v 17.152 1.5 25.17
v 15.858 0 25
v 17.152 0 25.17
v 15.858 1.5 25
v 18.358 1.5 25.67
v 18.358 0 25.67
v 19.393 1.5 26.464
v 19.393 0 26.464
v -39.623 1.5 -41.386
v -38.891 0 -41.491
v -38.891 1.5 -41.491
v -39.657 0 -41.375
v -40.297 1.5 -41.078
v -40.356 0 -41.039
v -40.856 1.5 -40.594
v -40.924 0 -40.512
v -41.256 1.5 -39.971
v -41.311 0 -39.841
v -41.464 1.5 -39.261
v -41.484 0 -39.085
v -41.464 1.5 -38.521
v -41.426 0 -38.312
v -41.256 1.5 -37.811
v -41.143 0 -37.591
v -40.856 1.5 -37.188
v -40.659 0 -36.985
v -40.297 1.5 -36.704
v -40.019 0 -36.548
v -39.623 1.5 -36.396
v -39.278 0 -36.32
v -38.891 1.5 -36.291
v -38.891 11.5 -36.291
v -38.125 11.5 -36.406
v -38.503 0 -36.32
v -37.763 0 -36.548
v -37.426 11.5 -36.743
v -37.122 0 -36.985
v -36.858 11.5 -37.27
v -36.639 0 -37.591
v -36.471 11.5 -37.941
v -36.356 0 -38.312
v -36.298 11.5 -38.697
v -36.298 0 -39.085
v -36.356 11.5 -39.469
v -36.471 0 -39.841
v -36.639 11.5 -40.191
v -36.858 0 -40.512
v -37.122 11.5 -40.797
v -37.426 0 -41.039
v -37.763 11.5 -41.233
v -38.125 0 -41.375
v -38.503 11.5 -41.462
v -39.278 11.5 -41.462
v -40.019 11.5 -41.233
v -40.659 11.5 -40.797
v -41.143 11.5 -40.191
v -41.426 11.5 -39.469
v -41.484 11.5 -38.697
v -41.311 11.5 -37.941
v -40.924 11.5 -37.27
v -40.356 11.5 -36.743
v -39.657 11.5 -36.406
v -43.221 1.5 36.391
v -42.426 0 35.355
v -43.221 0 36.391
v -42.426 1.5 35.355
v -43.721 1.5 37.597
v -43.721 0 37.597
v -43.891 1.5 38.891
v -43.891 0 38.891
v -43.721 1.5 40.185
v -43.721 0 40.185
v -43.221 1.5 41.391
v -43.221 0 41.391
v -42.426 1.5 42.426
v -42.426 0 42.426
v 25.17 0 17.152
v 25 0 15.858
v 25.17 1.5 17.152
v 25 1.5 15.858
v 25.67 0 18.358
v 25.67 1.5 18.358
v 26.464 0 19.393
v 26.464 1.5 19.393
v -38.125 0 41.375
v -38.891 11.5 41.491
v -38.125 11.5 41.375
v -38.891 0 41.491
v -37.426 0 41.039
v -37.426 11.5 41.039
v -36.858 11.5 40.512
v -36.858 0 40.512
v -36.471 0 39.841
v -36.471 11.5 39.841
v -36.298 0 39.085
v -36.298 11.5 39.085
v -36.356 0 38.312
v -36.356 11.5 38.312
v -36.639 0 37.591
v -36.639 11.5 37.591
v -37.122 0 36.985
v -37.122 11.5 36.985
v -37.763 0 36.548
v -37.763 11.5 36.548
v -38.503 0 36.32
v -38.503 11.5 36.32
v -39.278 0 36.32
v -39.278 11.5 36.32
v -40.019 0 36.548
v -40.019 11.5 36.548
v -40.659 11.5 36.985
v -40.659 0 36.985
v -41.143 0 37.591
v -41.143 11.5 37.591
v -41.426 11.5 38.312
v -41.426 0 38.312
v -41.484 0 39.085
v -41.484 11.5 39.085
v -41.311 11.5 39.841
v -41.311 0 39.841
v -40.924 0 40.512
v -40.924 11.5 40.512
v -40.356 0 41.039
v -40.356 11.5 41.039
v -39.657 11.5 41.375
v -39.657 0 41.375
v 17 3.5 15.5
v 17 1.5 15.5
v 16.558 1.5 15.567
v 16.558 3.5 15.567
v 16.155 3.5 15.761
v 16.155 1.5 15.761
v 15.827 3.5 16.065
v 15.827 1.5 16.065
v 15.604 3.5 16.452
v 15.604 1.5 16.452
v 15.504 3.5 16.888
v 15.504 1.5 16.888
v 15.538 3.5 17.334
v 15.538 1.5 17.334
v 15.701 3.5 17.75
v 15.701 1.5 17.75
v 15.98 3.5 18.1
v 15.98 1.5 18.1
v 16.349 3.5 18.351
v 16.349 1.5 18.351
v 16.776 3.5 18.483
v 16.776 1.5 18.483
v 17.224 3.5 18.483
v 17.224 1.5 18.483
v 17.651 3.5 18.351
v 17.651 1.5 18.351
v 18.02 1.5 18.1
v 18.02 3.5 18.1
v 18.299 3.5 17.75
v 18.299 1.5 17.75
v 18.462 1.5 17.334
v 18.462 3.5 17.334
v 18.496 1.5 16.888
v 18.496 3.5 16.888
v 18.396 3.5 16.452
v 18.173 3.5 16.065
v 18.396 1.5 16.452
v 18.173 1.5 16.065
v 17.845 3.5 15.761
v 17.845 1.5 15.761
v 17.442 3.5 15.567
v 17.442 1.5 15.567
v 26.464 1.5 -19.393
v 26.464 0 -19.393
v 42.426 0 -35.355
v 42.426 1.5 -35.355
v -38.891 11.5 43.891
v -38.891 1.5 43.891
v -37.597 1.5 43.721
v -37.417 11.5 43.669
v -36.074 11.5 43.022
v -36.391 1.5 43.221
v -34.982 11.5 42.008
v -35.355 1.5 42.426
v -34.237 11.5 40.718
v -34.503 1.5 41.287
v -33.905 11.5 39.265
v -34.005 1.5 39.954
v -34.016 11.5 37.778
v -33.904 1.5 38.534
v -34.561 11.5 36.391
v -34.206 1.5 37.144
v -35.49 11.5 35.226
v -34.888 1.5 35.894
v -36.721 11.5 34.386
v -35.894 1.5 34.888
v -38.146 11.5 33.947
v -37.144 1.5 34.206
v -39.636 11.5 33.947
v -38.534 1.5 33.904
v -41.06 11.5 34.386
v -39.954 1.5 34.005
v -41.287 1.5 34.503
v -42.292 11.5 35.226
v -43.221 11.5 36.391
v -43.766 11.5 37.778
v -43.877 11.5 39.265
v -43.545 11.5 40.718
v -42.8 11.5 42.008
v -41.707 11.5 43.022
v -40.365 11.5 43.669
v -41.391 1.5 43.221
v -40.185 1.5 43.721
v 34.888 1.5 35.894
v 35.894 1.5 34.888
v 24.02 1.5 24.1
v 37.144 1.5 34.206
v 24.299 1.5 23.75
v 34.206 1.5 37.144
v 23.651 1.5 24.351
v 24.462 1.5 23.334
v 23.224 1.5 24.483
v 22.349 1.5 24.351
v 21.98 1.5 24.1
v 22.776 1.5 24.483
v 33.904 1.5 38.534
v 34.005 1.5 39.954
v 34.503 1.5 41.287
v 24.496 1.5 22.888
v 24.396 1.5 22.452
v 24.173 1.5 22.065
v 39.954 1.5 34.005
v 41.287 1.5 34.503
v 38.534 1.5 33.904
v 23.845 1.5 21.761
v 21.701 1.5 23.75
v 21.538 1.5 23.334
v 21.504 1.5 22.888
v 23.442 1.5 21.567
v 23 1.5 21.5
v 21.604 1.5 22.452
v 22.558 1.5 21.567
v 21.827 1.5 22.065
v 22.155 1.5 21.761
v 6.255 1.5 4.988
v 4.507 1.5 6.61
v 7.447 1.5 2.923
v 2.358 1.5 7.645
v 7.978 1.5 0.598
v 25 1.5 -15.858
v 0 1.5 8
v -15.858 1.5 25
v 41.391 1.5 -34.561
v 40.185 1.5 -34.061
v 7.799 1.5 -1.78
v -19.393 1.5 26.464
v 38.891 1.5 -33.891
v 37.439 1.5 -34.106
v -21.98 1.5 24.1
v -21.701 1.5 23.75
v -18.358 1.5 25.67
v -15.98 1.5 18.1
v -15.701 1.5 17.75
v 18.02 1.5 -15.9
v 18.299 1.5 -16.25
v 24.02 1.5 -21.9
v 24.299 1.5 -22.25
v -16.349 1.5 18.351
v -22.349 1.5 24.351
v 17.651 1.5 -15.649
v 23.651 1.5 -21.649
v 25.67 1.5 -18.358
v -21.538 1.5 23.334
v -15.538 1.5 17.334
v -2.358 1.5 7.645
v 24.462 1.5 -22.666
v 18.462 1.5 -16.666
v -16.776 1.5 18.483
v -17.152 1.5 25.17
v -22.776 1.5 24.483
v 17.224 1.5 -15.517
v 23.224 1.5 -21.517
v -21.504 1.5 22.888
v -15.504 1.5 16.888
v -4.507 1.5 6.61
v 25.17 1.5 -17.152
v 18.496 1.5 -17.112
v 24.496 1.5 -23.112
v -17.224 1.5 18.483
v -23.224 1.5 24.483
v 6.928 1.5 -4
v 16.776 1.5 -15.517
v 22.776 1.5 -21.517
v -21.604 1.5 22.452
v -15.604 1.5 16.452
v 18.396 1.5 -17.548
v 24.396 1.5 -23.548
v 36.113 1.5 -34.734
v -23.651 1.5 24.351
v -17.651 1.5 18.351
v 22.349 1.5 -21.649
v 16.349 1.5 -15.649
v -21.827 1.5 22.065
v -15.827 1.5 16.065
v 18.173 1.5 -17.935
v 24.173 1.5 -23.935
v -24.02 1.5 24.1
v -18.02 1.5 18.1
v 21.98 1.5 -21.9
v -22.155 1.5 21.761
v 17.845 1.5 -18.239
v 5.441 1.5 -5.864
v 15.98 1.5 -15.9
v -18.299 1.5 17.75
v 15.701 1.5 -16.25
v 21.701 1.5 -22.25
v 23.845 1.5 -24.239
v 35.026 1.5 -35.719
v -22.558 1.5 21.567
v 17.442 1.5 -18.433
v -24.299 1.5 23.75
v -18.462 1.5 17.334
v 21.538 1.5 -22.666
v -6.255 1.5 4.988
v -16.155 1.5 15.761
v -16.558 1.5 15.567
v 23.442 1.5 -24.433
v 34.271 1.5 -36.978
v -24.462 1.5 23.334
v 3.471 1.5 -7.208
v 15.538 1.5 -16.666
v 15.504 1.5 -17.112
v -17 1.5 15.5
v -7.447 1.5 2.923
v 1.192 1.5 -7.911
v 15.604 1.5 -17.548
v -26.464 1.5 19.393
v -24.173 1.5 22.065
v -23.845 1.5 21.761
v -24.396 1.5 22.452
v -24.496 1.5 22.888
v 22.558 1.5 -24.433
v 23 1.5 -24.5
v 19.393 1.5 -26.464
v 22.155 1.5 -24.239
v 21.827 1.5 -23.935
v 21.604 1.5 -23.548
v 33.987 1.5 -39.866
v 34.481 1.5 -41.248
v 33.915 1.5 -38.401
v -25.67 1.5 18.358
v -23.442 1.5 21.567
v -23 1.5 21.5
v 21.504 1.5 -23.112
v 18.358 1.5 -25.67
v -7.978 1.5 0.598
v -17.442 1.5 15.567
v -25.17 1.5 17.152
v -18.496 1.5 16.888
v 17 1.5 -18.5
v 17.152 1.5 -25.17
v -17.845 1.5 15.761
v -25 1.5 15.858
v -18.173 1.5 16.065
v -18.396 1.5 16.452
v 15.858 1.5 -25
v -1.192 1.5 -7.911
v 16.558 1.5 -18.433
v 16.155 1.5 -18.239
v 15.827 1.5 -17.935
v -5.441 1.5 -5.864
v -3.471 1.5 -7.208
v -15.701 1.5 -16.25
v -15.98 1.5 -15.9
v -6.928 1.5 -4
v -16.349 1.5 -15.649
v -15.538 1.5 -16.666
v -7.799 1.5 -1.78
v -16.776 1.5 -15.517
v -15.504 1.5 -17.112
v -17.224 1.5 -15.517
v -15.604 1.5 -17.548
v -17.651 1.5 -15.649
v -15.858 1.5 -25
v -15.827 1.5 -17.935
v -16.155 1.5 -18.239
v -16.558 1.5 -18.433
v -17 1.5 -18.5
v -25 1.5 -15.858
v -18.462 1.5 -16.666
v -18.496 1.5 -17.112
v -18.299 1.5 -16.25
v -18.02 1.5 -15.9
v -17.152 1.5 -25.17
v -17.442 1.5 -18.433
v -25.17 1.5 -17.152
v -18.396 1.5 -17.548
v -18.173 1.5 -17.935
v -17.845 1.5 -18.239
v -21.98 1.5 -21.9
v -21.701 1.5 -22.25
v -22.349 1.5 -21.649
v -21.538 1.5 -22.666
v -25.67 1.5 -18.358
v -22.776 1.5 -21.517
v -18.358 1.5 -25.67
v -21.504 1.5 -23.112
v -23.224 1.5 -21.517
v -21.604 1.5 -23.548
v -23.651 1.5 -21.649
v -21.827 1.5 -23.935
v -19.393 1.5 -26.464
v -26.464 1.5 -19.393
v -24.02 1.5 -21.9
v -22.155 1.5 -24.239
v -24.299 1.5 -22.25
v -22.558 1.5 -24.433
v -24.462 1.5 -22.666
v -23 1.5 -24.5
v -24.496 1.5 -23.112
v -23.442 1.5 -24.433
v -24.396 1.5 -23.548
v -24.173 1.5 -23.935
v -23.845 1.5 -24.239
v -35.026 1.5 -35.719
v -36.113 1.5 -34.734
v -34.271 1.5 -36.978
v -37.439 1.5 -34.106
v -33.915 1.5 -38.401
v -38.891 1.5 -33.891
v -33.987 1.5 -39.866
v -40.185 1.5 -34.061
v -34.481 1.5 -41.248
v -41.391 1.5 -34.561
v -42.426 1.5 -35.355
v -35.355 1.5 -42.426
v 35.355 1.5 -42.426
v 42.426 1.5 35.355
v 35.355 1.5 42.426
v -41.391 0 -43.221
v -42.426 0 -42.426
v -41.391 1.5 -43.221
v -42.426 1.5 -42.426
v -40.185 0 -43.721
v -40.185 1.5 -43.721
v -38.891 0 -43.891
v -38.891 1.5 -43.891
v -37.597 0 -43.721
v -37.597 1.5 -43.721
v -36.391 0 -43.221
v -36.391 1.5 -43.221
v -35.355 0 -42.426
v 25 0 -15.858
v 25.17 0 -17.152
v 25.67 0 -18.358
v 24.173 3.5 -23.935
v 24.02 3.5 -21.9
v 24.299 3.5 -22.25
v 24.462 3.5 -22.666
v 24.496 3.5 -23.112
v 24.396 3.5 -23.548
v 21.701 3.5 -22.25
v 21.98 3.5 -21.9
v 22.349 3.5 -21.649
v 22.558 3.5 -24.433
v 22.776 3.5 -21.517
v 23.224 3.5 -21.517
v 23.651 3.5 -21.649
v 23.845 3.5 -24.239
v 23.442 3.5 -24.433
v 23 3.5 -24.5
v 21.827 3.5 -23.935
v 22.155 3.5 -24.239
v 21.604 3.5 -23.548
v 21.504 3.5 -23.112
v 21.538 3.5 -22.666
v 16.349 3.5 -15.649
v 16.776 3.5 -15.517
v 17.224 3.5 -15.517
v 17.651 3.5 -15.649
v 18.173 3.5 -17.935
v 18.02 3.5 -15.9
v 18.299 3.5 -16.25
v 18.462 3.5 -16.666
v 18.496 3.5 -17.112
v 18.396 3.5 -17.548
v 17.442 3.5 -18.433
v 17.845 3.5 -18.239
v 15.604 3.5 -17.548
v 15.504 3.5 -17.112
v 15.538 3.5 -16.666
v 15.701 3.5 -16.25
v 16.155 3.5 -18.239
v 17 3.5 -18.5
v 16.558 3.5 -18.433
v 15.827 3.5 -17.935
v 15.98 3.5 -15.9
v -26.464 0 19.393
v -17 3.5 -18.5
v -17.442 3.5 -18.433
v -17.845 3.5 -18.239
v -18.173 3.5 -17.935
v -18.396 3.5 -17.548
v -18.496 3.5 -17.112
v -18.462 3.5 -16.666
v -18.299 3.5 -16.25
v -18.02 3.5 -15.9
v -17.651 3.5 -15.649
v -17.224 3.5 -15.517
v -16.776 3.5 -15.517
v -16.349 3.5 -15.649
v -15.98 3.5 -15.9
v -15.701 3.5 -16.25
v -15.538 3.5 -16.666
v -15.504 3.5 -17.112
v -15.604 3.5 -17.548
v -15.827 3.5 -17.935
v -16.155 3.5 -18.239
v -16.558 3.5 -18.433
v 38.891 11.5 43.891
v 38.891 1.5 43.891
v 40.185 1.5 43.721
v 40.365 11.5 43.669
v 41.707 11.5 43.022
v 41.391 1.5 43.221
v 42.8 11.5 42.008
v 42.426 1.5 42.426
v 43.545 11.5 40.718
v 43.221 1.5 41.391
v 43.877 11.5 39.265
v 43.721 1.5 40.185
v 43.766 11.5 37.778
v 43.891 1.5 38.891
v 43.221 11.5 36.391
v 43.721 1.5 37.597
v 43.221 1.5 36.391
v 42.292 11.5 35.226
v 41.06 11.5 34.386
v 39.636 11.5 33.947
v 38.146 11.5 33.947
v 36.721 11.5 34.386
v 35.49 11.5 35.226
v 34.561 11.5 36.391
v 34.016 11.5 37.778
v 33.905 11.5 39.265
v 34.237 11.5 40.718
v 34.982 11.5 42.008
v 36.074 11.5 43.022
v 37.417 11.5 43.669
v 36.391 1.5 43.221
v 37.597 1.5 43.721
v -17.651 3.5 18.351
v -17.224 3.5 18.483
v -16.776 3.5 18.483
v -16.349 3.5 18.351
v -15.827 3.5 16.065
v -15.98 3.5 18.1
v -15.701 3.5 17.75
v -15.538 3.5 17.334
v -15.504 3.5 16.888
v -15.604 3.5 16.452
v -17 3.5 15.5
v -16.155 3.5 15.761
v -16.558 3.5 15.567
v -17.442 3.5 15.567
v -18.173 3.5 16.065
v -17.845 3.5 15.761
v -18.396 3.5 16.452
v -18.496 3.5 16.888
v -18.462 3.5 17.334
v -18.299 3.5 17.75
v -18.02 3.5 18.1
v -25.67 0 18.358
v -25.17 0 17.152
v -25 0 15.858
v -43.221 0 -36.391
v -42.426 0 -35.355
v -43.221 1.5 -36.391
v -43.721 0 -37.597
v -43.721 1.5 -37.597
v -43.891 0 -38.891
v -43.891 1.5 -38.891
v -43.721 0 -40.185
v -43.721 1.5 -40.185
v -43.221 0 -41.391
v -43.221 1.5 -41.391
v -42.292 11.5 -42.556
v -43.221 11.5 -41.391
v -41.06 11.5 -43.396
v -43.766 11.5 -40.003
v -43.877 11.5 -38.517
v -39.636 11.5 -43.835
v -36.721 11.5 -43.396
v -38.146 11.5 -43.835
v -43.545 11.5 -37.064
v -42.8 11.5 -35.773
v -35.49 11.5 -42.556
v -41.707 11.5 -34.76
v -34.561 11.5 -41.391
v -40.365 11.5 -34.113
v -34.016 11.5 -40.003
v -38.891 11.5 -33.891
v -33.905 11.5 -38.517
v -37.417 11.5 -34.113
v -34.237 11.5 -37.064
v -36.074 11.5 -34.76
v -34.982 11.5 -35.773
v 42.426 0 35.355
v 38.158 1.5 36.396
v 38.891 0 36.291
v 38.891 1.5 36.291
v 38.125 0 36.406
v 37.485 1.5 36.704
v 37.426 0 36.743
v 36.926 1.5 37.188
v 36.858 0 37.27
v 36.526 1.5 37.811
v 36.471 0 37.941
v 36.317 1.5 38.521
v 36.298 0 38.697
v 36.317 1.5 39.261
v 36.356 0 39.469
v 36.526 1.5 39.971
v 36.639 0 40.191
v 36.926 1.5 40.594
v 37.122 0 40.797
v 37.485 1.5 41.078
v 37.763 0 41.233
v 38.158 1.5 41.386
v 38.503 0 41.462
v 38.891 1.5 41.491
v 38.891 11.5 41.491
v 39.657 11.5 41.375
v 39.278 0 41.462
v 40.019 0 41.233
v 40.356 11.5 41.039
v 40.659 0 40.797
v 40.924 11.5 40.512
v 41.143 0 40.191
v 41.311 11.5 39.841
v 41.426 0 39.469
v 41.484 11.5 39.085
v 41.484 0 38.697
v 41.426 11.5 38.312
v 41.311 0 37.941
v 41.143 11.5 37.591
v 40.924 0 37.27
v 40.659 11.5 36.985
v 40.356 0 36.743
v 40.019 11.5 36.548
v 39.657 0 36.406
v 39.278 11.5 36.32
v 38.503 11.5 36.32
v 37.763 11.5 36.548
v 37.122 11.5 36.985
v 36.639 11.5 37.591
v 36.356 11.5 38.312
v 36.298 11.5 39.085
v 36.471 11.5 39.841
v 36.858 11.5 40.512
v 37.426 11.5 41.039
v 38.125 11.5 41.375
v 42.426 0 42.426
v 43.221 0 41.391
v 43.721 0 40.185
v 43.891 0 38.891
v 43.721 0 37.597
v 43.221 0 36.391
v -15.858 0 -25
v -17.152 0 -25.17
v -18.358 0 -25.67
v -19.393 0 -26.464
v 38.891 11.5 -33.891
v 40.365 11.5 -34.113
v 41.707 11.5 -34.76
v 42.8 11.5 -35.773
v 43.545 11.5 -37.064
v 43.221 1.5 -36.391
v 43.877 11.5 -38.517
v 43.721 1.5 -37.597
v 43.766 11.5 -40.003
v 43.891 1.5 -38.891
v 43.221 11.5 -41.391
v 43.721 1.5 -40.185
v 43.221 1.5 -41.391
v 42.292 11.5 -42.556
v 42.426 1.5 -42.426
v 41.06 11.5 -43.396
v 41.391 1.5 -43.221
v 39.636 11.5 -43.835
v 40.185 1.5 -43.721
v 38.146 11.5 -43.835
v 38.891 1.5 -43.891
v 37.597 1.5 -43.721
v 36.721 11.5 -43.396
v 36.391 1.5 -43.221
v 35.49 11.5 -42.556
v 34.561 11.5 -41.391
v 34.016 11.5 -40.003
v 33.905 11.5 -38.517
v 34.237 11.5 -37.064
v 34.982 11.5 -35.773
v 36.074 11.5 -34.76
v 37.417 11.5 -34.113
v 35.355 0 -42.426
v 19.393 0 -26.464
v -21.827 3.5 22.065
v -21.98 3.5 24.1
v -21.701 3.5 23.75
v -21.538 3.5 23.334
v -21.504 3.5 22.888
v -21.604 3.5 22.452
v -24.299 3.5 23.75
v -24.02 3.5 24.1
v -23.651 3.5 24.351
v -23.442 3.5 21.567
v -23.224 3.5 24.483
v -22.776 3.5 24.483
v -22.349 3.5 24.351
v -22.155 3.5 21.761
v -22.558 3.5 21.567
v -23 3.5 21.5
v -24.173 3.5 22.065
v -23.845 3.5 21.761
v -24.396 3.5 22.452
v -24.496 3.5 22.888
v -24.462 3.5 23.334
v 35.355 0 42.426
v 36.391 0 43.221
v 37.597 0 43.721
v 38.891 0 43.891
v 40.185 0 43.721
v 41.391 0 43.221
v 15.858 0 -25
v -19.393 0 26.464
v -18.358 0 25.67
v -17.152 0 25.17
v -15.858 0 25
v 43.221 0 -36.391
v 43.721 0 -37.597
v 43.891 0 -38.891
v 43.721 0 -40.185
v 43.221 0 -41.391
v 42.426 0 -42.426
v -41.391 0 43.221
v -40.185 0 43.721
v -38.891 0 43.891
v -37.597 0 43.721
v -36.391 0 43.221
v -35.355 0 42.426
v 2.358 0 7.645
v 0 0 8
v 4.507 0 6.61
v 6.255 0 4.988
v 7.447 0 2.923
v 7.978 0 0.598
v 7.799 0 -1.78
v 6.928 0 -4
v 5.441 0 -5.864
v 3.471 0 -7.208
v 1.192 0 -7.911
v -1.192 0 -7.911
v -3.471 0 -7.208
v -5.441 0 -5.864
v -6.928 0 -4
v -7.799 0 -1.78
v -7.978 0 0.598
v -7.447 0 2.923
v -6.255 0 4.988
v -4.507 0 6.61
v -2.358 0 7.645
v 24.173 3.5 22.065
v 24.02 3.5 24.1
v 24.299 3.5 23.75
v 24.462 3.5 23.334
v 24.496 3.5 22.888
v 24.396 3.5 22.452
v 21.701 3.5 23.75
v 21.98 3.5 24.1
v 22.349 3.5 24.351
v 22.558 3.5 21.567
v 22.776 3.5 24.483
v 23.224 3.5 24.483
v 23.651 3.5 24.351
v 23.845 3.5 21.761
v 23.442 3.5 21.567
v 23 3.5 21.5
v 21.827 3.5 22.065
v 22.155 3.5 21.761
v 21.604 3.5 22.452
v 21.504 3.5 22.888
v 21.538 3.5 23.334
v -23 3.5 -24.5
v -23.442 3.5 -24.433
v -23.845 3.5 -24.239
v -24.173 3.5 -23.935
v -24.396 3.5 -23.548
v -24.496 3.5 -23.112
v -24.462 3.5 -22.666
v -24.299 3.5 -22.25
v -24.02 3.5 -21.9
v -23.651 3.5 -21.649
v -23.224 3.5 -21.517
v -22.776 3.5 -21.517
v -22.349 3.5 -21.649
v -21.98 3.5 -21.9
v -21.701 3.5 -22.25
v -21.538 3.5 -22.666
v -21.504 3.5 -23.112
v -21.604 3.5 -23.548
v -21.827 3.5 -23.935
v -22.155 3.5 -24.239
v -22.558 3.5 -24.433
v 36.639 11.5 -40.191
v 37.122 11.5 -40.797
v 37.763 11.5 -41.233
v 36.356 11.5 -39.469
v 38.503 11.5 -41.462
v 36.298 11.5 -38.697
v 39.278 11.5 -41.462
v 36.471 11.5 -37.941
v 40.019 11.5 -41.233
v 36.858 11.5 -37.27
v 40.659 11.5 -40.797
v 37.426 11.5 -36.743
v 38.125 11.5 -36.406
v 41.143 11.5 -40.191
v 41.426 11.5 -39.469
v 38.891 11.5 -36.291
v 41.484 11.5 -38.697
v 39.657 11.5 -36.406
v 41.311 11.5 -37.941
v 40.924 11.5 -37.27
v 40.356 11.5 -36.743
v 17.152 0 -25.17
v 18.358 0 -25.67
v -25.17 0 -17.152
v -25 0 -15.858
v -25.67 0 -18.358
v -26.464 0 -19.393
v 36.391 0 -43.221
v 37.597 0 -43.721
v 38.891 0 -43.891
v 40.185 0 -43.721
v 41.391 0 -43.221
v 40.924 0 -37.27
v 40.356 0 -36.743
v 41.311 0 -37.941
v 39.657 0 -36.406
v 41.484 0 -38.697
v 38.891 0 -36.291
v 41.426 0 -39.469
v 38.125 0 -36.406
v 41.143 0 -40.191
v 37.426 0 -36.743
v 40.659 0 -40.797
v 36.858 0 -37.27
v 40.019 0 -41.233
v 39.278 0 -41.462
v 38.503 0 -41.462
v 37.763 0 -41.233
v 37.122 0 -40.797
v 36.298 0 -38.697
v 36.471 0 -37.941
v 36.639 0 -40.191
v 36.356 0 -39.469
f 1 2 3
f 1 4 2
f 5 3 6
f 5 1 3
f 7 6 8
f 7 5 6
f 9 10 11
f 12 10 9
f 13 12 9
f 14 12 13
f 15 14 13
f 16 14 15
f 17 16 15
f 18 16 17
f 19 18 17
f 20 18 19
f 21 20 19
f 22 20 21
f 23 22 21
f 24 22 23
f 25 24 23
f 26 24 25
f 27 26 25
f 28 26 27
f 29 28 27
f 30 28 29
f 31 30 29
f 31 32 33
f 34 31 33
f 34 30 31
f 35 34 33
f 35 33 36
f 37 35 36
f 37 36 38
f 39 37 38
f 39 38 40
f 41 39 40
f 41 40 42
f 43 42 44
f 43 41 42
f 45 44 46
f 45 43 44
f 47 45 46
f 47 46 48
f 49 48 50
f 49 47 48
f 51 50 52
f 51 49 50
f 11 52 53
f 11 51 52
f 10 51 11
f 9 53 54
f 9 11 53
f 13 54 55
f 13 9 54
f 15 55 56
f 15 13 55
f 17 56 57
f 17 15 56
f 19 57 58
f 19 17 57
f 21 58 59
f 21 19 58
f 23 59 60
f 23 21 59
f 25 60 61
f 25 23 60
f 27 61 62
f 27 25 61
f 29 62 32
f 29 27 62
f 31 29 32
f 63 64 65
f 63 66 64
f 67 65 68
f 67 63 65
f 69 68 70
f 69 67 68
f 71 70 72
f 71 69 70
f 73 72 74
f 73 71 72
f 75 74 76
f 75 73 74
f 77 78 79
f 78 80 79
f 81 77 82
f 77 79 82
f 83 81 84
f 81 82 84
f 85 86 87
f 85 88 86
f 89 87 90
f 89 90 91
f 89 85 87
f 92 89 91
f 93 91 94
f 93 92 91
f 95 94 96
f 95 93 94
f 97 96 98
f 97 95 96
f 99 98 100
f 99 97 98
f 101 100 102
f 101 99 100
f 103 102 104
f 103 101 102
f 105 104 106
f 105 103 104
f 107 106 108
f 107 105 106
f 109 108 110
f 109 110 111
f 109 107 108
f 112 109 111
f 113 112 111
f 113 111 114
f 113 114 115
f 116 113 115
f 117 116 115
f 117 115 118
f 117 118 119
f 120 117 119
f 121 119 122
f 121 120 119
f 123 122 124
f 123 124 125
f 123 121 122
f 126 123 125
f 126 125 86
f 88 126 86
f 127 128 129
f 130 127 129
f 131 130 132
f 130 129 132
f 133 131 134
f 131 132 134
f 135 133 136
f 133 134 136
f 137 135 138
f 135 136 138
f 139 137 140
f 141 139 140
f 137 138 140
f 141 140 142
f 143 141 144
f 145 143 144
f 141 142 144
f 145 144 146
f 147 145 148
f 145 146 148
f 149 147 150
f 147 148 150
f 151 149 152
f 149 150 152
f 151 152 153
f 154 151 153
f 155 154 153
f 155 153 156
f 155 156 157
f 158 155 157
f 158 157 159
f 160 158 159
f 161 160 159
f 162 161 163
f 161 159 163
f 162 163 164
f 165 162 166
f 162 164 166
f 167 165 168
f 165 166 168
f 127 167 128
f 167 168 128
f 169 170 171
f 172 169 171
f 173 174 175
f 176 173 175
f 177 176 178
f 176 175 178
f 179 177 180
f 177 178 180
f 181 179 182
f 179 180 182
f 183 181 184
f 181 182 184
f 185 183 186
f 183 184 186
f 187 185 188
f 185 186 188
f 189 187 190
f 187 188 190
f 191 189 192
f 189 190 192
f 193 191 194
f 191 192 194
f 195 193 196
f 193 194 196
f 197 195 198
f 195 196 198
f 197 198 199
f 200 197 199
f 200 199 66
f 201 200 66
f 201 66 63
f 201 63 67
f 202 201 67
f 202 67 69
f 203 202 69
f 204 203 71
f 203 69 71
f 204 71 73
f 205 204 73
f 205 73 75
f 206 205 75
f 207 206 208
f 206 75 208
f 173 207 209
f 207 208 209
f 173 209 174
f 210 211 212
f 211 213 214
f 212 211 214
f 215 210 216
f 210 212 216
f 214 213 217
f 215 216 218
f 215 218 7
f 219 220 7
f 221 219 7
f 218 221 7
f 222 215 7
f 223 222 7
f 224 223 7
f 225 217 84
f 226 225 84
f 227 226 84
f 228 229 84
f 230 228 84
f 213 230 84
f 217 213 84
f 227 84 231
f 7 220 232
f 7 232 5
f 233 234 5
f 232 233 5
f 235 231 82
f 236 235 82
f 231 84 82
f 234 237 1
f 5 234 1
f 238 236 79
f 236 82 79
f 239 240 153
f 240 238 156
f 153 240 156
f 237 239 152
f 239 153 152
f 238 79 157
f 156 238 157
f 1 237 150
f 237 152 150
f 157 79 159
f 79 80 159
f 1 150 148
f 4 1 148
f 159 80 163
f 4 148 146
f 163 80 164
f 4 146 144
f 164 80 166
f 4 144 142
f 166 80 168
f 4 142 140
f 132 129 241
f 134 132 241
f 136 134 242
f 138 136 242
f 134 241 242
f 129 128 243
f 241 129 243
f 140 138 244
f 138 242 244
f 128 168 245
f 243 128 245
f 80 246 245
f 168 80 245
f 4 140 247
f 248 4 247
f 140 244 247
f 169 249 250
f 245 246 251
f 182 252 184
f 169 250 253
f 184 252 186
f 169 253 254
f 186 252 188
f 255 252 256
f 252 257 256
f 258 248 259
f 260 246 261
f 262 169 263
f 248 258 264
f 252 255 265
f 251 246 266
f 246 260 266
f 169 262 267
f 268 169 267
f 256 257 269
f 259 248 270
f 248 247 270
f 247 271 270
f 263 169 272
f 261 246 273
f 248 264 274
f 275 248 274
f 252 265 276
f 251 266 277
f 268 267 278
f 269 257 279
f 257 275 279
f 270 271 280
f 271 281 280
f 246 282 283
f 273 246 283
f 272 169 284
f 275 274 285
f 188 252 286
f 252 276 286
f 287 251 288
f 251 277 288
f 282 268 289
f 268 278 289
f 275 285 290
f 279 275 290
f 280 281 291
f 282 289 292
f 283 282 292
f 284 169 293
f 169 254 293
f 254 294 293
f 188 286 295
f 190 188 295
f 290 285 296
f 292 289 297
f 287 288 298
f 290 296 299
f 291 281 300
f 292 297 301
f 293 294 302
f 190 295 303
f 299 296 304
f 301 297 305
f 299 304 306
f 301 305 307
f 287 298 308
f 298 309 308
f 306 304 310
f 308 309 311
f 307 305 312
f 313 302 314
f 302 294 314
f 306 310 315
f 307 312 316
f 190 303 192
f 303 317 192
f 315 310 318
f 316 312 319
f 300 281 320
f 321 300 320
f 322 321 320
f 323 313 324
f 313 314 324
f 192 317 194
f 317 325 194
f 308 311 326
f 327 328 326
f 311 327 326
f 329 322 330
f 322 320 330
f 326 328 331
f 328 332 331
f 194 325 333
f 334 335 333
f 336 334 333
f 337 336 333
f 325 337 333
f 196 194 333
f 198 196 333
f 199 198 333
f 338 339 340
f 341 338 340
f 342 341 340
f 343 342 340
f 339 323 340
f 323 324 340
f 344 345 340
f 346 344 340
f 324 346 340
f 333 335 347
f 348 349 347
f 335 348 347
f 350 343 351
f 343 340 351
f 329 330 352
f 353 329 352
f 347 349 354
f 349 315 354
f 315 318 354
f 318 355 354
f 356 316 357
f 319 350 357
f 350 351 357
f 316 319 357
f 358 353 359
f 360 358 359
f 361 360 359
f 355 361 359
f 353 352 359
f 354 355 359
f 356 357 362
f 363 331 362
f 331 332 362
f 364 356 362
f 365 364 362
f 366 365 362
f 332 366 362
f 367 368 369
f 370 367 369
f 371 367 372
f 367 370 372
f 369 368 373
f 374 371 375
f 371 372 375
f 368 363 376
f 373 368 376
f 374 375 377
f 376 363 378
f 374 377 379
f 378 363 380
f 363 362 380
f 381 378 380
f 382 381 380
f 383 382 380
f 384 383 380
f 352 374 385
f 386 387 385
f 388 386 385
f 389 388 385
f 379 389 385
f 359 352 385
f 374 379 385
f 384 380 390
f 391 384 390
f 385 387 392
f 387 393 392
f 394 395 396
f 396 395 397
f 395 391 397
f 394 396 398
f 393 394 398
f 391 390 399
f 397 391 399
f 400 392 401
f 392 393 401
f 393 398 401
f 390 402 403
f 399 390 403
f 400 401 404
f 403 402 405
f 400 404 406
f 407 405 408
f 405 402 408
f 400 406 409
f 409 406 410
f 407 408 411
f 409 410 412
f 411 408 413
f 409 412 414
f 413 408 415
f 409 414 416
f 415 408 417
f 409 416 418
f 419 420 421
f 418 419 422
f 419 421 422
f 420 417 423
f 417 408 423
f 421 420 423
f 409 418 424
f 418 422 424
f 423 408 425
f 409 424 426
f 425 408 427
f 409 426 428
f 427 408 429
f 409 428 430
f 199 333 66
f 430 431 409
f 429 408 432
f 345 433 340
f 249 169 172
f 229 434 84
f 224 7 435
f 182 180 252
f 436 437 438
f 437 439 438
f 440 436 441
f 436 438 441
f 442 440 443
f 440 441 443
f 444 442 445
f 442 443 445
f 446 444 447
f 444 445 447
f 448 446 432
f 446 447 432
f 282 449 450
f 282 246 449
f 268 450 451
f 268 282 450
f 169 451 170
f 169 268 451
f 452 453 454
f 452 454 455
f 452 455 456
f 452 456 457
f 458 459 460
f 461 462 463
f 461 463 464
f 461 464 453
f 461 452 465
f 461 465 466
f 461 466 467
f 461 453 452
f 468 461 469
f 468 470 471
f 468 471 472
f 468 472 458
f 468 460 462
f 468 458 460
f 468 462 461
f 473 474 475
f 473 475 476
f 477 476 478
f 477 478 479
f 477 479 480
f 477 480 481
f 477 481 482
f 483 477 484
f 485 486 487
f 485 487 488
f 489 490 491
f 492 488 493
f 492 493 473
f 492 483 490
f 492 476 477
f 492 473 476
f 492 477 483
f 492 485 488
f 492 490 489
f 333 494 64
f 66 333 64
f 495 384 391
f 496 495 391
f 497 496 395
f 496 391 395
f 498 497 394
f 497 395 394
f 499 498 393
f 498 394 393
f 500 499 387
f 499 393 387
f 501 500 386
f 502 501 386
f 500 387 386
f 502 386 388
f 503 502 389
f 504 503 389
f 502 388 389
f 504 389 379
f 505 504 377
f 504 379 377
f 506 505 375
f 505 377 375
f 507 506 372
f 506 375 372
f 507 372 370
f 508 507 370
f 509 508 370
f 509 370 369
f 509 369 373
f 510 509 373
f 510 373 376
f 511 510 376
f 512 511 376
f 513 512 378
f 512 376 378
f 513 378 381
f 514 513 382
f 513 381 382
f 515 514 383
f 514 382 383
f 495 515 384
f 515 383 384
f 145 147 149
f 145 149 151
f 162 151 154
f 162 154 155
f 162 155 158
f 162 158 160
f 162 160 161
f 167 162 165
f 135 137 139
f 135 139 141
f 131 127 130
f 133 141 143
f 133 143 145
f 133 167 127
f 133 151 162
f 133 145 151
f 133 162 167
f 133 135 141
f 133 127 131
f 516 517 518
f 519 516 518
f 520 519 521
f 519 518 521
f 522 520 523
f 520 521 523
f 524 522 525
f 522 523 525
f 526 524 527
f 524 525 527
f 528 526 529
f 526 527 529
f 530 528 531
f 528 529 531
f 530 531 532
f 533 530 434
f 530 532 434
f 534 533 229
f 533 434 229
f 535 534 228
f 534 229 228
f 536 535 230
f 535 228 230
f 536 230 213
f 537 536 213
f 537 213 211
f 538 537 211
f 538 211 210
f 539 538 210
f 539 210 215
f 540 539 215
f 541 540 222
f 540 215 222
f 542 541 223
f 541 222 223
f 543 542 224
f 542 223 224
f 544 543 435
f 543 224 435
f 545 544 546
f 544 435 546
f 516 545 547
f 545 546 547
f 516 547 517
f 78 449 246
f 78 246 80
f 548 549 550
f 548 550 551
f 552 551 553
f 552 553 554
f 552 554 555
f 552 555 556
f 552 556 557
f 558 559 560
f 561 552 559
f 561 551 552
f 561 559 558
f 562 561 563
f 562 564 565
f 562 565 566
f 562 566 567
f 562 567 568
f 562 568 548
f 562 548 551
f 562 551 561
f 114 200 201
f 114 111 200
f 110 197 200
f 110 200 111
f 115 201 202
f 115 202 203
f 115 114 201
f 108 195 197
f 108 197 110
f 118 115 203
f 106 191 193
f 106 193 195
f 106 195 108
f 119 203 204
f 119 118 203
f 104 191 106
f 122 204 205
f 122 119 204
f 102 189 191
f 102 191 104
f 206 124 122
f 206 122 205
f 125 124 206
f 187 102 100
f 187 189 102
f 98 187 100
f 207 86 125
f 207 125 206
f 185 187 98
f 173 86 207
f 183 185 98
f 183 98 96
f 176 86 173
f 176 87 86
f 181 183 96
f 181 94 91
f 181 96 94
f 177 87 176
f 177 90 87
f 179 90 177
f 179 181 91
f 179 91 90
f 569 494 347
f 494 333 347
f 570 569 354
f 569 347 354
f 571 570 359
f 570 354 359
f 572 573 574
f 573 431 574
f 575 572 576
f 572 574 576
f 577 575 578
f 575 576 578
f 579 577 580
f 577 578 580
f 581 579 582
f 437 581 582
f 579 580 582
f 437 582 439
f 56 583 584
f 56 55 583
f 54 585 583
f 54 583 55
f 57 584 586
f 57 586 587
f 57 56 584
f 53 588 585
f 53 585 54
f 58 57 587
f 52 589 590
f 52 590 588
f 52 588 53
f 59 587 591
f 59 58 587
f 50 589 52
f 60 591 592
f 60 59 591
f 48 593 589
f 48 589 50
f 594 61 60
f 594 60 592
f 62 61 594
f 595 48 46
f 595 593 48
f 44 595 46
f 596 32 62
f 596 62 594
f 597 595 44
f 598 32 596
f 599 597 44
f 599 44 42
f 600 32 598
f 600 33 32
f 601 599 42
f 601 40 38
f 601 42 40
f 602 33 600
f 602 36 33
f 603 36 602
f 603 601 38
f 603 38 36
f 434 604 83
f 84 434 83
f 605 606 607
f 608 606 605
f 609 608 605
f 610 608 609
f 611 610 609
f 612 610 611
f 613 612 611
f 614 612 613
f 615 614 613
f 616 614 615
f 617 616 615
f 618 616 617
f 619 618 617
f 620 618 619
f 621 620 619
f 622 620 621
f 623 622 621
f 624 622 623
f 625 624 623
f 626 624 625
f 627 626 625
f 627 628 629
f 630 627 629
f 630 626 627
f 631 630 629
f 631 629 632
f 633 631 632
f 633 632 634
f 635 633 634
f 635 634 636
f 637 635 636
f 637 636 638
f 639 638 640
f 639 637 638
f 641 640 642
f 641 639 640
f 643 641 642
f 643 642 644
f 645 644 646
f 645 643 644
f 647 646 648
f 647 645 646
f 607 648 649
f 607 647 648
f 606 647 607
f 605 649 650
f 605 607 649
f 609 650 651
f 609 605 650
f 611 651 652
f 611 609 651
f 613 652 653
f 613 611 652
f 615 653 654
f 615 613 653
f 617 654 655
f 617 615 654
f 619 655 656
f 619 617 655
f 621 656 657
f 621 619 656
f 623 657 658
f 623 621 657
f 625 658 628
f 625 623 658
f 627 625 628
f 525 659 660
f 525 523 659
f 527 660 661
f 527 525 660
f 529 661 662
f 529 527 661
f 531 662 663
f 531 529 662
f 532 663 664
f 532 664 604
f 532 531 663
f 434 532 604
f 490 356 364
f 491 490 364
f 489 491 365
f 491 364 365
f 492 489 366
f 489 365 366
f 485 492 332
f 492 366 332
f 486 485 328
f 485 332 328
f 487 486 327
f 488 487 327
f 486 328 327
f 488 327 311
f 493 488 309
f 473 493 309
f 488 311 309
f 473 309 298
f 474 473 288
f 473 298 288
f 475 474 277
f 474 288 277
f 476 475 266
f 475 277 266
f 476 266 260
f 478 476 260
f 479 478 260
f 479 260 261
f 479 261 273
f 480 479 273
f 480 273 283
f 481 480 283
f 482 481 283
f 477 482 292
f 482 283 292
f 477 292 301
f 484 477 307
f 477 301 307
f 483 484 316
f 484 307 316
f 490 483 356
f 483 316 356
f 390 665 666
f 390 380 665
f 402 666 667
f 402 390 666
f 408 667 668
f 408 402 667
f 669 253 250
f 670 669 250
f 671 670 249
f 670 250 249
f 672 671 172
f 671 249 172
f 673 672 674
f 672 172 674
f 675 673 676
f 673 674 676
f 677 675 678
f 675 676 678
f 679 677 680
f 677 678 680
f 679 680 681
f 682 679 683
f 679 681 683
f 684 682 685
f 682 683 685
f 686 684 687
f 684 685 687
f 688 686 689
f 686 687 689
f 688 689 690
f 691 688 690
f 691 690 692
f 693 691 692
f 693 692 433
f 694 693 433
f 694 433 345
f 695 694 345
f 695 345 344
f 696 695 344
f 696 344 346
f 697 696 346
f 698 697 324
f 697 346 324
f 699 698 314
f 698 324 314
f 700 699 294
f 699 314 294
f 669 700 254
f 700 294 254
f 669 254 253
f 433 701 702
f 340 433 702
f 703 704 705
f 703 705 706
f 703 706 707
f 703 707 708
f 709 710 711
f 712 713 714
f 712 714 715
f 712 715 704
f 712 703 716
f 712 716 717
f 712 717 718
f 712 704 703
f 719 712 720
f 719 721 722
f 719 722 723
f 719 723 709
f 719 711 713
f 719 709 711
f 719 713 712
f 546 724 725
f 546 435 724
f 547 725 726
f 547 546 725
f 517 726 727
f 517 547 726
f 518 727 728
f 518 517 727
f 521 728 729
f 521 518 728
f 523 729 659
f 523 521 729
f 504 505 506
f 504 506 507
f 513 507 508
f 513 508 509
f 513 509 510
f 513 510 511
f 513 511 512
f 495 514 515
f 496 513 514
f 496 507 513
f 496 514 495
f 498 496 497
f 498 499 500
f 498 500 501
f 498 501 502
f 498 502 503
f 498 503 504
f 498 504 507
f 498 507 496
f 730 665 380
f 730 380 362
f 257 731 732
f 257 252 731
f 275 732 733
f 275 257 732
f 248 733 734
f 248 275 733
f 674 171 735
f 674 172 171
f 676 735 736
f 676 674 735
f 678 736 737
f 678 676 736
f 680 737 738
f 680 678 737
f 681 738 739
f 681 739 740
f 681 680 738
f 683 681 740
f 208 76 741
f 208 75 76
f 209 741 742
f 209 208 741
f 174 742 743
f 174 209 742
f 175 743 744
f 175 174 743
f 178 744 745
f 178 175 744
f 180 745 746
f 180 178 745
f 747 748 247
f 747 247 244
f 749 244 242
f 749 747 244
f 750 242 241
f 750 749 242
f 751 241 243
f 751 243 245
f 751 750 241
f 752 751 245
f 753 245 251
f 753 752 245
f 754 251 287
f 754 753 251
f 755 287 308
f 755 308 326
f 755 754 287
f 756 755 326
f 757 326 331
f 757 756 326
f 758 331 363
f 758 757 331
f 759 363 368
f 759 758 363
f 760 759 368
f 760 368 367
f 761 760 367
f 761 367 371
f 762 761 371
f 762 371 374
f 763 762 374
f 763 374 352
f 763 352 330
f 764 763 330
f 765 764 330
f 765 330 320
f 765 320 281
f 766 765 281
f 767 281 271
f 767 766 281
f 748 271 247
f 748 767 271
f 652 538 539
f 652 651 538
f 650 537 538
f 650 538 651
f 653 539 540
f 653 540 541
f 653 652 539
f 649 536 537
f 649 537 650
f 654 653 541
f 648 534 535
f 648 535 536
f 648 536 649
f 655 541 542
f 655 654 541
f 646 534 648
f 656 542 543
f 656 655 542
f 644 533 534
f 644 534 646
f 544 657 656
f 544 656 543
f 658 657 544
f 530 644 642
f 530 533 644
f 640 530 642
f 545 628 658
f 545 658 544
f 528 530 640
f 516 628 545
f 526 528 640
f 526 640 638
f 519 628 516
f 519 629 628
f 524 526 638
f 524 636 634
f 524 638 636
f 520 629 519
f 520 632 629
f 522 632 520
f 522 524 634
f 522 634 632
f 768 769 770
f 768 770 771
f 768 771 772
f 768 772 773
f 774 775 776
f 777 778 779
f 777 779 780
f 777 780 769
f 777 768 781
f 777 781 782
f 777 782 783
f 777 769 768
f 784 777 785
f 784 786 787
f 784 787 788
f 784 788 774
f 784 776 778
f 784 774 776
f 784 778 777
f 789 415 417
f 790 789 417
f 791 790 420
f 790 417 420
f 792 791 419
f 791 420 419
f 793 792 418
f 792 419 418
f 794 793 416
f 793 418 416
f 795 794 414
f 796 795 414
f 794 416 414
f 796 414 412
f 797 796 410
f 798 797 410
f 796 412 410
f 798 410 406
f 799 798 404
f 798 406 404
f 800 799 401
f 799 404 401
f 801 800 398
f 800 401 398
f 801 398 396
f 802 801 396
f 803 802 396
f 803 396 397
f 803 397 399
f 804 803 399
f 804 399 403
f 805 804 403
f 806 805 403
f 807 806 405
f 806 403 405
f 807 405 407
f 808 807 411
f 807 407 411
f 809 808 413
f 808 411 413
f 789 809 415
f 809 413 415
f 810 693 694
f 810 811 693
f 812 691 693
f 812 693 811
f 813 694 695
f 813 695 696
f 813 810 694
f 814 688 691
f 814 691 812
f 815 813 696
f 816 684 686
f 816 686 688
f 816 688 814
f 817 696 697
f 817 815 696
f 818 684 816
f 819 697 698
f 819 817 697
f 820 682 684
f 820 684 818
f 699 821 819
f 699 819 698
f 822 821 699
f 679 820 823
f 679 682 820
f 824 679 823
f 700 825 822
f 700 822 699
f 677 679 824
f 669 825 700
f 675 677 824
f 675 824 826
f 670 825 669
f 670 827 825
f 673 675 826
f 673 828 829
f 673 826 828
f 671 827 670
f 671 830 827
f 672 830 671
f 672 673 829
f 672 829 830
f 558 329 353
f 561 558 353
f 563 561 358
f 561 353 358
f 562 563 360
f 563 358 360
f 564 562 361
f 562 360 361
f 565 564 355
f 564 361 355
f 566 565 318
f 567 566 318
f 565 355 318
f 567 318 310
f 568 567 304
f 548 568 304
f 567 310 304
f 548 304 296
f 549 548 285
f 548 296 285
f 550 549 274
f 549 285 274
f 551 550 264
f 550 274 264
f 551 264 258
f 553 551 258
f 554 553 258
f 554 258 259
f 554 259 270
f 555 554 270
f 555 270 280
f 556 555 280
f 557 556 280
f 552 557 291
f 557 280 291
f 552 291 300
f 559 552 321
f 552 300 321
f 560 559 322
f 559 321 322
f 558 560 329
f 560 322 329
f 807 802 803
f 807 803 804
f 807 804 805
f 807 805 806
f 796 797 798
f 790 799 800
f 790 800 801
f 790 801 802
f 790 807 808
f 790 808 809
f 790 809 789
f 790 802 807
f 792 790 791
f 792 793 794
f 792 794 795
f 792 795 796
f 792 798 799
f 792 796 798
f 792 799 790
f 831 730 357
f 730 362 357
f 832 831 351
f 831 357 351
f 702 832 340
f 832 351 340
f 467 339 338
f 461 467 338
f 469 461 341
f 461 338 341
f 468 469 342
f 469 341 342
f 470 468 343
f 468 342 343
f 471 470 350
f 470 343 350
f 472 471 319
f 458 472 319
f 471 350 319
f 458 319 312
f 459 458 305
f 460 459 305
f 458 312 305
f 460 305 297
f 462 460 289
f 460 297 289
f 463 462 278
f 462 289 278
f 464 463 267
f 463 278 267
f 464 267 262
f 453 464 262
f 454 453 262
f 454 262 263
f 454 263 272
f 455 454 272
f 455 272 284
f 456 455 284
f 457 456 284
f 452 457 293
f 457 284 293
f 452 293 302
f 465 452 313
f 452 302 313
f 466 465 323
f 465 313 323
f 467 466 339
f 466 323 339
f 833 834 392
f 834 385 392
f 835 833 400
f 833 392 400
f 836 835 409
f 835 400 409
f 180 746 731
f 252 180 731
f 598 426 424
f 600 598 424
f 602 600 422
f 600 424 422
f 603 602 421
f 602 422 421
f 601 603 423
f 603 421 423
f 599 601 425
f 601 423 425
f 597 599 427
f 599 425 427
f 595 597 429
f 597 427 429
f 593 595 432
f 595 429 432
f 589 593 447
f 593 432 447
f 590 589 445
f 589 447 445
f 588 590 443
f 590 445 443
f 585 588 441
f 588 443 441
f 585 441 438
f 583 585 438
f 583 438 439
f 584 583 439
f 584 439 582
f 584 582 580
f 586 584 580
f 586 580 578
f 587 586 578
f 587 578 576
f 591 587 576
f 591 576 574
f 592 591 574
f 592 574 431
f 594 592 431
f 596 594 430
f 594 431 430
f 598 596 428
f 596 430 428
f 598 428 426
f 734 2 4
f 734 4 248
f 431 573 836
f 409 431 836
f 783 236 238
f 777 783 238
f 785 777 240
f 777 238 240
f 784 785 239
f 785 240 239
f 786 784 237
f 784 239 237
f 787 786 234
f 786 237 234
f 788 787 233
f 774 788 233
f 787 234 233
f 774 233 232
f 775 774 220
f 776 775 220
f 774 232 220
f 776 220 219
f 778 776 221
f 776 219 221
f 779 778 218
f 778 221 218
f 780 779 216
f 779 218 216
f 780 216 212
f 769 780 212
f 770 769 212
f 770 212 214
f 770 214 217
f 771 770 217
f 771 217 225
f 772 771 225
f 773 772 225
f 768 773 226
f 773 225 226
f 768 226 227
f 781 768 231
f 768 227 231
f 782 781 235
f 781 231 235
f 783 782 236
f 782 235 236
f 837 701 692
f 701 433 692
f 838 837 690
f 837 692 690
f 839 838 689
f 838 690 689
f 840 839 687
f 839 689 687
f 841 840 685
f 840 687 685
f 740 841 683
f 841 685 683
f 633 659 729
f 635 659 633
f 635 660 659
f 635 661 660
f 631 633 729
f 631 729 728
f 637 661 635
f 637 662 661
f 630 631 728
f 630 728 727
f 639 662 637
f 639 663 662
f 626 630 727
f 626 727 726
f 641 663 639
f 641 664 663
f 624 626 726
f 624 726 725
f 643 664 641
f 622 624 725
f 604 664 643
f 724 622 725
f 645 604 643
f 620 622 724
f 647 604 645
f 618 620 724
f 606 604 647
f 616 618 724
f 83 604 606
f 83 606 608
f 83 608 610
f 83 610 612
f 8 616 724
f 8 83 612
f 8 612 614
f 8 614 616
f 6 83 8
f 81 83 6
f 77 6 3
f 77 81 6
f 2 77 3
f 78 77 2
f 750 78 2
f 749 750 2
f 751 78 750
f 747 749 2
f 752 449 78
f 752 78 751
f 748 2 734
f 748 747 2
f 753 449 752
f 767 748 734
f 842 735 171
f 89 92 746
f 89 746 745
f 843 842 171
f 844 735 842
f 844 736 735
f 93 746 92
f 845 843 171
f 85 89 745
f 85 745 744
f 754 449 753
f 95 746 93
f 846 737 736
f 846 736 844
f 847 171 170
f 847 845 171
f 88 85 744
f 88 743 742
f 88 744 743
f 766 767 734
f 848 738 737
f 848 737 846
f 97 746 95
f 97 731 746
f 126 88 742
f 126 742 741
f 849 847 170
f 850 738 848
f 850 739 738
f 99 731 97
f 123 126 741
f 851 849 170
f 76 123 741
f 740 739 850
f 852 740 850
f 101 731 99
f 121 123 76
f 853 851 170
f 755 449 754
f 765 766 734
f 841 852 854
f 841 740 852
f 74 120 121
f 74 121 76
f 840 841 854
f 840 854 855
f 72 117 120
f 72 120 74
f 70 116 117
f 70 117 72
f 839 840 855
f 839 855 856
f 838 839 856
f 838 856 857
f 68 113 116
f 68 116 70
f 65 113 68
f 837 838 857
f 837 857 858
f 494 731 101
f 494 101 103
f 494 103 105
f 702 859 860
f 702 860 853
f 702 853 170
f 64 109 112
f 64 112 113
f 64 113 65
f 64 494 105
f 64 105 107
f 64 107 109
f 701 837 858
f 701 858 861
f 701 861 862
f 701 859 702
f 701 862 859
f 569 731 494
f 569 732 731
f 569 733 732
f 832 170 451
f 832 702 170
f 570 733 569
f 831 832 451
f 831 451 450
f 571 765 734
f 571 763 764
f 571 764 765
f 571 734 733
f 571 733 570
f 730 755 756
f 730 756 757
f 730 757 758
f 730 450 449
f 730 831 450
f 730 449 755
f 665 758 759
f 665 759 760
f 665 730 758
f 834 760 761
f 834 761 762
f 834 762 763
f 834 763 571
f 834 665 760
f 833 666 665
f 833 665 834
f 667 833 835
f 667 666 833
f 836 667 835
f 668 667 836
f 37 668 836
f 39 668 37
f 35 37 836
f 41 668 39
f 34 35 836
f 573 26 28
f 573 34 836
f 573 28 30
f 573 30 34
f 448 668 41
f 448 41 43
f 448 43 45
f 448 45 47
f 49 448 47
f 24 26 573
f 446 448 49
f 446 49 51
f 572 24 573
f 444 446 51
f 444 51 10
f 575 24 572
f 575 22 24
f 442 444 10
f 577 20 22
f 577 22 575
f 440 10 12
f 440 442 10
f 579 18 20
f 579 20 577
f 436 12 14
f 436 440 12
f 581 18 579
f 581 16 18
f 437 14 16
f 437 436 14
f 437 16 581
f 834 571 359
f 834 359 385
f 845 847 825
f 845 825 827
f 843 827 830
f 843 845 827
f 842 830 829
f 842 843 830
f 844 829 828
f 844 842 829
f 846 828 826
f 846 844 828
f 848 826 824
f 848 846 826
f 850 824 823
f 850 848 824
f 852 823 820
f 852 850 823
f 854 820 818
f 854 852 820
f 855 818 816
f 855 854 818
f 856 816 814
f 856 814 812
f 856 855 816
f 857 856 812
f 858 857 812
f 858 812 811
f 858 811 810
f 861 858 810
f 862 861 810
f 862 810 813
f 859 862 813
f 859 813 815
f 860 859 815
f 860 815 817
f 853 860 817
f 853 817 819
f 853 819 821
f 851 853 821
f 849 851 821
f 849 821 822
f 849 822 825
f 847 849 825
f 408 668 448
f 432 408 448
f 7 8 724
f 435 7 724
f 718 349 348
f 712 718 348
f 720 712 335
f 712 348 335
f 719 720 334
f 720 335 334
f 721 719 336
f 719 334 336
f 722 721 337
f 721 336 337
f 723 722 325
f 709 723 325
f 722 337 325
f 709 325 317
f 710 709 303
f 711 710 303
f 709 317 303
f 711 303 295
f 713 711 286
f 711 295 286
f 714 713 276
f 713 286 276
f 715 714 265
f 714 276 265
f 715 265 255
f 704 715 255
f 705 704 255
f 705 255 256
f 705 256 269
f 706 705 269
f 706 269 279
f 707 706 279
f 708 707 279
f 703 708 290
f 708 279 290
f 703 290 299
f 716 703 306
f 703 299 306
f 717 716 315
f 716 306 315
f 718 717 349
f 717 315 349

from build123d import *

# Parameters (mm, degrees)
SKETCH1_W           = 50
SKETCH1_H           = 50
SKETCH1_R           = 8
BOSS_EXTRUDE1_DEPTH = 1.5
SKETCH4_R           = 1.5
BOSS_EXTRUDE2_DEPTH = 2
BOSS_EXTRUDE3_START = -1.5
SKETCH5_R           = 2.6
SKETCH5_R_2         = 8
BOSS_EXTRUDE3_DEPTH = 1.5
FILLET1_R           = 5
SKETCH6_R           = 5
SKETCH6_R_2         = 2.6
BOSS_EXTRUDE4_DEPTH = 10


with BuildPart() as part:
    # Sketch1 → Boss-Extrude1 (new body)
    with BuildSketch(Plane(origin=(0, 0, 0), x_dir=(1, 0, 0), z_dir=(0, 1, 0))):
        Rectangle(SKETCH1_W, SKETCH1_H)
        with Locations(Location((0, 0, 0), (0, 0, 270))):
            Circle(SKETCH1_R, mode=Mode.SUBTRACT)
    extrude(amount=BOSS_EXTRUDE1_DEPTH)

    # Sketch4 → Boss-Extrude2 (add)
    with BuildSketch(Plane(origin=(0, 1.5, 0), x_dir=(1, 0, 0), z_dir=(0, 1, 0))):
        with Locations(Location((-23, 23, 0), (0, 0, 90))):
            Circle(SKETCH4_R)
        with Locations(Location((-17, 17, 0), (0, 0, 90))):
            Circle(SKETCH4_R)
        with Locations(Location((17, 17, 0), (0, 0, 90))):
            Circle(SKETCH4_R)
        with Locations(Location((23, 23, 0), (0, 0, 90))):
            Circle(SKETCH4_R)
        with Locations(Location((-17, -17, 0), (0, 0, 90))):
            Circle(SKETCH4_R)
        with Locations(Location((-23, -23, 0), (0, 0, 90))):
            Circle(SKETCH4_R)
        with Locations(Location((17, -17, 0), (0, 0, 90))):
            Circle(SKETCH4_R)
        with Locations(Location((23, -23, 0), (0, 0, 90))):
            Circle(SKETCH4_R)
    extrude(amount=BOSS_EXTRUDE2_DEPTH)

    # Sketch5 → Boss-Extrude3 (add)
    with BuildSketch(Plane(origin=(0, 1.5, 0), x_dir=(1, 0, 0), z_dir=(0, 1, 0)).offset(BOSS_EXTRUDE3_START)):
        Polygon((-42.426406871, -35.355339059), (-25, -17.928932188), (-25, 17.928932188), (-42.426406871, 35.355339059), (-45.961940777, 38.890872965), (-38.890872965, 45.961940777), (-35.355339059, 42.426406871), (-17.928932188, 25), (17.928932188, 25), (35.355339059, 42.426406871), (38.890872965, 45.961940777), (45.961940777, 38.890872965), (42.426406871, 35.355339059), (25, 17.928932188), (25, -17.928932188), (42.426406871, -35.355339059), (45.961940777, -38.890872965), (38.890872965, -45.961940777), (35.355339059, -42.426406871), (17.928932188, -25), (-17.928932188, -25), (-35.355339059, -42.426406871), (-38.890872965, -45.961940777), (-45.961940777, -38.890872965), align=None)
        with Locations(Location((-38.890872965, -38.890872965, 0), (0, 0, 270))):
            Circle(SKETCH5_R, mode=Mode.SUBTRACT)
        with Locations(Location((38.890872965, 38.890872965, 0), (0, 0, 270))):
            Circle(SKETCH5_R, mode=Mode.SUBTRACT)
        with Locations(Location((38.890872965, -38.890872965, 0), (0, 0, 90))):
            Circle(SKETCH5_R, mode=Mode.SUBTRACT)
        with Locations(Location((-38.890872965, 38.890872965, 0), (0, 0, 90))):
            Circle(SKETCH5_R, mode=Mode.SUBTRACT)
        with Locations(Location((0, 0, 0), (0, 0, 270))):
            Circle(SKETCH5_R_2, mode=Mode.SUBTRACT)
    extrude(amount=BOSS_EXTRUDE3_DEPTH)

    # Fillet1
    fillet1_edges = [part.edges().sort_by_distance(p)[0] for p in [
        (17.928932188, 0.75, 25),
        (38.890872965, 0.75, 45.961940777),
        (45.961940777, 0.75, 38.890872965),
        (25, 0.75, 17.928932188),
        (25, 0.75, -17.928932188),
        (45.961940777, 0.75, -38.890872965),
        (38.890872965, 0.75, -45.961940777),
        (17.928932188, 0.75, -25),
        (-17.928932188, 0.75, -25),
        (-38.890872965, 0.75, -45.961940777),
        (-45.961940777, 0.75, -38.890872965),
        (-25, 0.75, -17.928932188),
        (-25, 0.75, 17.928932188),
        (-45.961940777, 0.75, 38.890872965),
        (-38.890872965, 0.75, 45.961940777),
        (-17.928932188, 0.75, 25),
    ]]
    fillet(fillet1_edges, radius=FILLET1_R - 0.0001)  # a hair under: the kernel refuses the full size

    # Sketch6 → Boss-Extrude4 (add)
    # profile 1 of 4: a face of its own
    with BuildSketch(Plane(origin=(0, 1.5, 0), x_dir=(1, 0, 0), z_dir=(0, 1, 0))):
        with Locations(Location((-38.890872965, -38.890872965, 0), (0, 0, 270))):
            Circle(SKETCH6_R)
        with Locations(Location((-38.890872965, -38.890872965, 0), (0, 0, 270))):
            Circle(SKETCH6_R_2, mode=Mode.SUBTRACT)
    # profile 2 of 4: a face of its own
    with BuildSketch(Plane(origin=(0, 1.5, 0), x_dir=(1, 0, 0), z_dir=(0, 1, 0))):
        with Locations(Location((-38.890872965, 38.890872965, 0), (0, 0, 270))):
            Circle(SKETCH6_R)
        with Locations(Location((-38.890872965, 38.890872965, 0), (0, 0, 270))):
            Circle(SKETCH6_R_2, mode=Mode.SUBTRACT)
    # profile 3 of 4: a face of its own
    with BuildSketch(Plane(origin=(0, 1.5, 0), x_dir=(1, 0, 0), z_dir=(0, 1, 0))):
        with Locations(Location((38.890872965, 38.890872965, 0), (0, 0, 270))):
            Circle(SKETCH6_R)
        with Locations(Location((38.890872965, 38.890872965, 0), (0, 0, 270))):
            Circle(SKETCH6_R_2, mode=Mode.SUBTRACT)
    # profile 4 of 4: a face of its own
    with BuildSketch(Plane(origin=(0, 1.5, 0), x_dir=(1, 0, 0), z_dir=(0, 1, 0))):
        with Locations(Location((38.890872965, -38.890872965, 0), (0, 0, 270))):
            Circle(SKETCH6_R)
        with Locations(Location((38.890872965, -38.890872965, 0), (0, 0, 270))):
            Circle(SKETCH6_R_2, mode=Mode.SUBTRACT)
    extrude(amount=BOSS_EXTRUDE4_DEPTH)


solid = part.part
